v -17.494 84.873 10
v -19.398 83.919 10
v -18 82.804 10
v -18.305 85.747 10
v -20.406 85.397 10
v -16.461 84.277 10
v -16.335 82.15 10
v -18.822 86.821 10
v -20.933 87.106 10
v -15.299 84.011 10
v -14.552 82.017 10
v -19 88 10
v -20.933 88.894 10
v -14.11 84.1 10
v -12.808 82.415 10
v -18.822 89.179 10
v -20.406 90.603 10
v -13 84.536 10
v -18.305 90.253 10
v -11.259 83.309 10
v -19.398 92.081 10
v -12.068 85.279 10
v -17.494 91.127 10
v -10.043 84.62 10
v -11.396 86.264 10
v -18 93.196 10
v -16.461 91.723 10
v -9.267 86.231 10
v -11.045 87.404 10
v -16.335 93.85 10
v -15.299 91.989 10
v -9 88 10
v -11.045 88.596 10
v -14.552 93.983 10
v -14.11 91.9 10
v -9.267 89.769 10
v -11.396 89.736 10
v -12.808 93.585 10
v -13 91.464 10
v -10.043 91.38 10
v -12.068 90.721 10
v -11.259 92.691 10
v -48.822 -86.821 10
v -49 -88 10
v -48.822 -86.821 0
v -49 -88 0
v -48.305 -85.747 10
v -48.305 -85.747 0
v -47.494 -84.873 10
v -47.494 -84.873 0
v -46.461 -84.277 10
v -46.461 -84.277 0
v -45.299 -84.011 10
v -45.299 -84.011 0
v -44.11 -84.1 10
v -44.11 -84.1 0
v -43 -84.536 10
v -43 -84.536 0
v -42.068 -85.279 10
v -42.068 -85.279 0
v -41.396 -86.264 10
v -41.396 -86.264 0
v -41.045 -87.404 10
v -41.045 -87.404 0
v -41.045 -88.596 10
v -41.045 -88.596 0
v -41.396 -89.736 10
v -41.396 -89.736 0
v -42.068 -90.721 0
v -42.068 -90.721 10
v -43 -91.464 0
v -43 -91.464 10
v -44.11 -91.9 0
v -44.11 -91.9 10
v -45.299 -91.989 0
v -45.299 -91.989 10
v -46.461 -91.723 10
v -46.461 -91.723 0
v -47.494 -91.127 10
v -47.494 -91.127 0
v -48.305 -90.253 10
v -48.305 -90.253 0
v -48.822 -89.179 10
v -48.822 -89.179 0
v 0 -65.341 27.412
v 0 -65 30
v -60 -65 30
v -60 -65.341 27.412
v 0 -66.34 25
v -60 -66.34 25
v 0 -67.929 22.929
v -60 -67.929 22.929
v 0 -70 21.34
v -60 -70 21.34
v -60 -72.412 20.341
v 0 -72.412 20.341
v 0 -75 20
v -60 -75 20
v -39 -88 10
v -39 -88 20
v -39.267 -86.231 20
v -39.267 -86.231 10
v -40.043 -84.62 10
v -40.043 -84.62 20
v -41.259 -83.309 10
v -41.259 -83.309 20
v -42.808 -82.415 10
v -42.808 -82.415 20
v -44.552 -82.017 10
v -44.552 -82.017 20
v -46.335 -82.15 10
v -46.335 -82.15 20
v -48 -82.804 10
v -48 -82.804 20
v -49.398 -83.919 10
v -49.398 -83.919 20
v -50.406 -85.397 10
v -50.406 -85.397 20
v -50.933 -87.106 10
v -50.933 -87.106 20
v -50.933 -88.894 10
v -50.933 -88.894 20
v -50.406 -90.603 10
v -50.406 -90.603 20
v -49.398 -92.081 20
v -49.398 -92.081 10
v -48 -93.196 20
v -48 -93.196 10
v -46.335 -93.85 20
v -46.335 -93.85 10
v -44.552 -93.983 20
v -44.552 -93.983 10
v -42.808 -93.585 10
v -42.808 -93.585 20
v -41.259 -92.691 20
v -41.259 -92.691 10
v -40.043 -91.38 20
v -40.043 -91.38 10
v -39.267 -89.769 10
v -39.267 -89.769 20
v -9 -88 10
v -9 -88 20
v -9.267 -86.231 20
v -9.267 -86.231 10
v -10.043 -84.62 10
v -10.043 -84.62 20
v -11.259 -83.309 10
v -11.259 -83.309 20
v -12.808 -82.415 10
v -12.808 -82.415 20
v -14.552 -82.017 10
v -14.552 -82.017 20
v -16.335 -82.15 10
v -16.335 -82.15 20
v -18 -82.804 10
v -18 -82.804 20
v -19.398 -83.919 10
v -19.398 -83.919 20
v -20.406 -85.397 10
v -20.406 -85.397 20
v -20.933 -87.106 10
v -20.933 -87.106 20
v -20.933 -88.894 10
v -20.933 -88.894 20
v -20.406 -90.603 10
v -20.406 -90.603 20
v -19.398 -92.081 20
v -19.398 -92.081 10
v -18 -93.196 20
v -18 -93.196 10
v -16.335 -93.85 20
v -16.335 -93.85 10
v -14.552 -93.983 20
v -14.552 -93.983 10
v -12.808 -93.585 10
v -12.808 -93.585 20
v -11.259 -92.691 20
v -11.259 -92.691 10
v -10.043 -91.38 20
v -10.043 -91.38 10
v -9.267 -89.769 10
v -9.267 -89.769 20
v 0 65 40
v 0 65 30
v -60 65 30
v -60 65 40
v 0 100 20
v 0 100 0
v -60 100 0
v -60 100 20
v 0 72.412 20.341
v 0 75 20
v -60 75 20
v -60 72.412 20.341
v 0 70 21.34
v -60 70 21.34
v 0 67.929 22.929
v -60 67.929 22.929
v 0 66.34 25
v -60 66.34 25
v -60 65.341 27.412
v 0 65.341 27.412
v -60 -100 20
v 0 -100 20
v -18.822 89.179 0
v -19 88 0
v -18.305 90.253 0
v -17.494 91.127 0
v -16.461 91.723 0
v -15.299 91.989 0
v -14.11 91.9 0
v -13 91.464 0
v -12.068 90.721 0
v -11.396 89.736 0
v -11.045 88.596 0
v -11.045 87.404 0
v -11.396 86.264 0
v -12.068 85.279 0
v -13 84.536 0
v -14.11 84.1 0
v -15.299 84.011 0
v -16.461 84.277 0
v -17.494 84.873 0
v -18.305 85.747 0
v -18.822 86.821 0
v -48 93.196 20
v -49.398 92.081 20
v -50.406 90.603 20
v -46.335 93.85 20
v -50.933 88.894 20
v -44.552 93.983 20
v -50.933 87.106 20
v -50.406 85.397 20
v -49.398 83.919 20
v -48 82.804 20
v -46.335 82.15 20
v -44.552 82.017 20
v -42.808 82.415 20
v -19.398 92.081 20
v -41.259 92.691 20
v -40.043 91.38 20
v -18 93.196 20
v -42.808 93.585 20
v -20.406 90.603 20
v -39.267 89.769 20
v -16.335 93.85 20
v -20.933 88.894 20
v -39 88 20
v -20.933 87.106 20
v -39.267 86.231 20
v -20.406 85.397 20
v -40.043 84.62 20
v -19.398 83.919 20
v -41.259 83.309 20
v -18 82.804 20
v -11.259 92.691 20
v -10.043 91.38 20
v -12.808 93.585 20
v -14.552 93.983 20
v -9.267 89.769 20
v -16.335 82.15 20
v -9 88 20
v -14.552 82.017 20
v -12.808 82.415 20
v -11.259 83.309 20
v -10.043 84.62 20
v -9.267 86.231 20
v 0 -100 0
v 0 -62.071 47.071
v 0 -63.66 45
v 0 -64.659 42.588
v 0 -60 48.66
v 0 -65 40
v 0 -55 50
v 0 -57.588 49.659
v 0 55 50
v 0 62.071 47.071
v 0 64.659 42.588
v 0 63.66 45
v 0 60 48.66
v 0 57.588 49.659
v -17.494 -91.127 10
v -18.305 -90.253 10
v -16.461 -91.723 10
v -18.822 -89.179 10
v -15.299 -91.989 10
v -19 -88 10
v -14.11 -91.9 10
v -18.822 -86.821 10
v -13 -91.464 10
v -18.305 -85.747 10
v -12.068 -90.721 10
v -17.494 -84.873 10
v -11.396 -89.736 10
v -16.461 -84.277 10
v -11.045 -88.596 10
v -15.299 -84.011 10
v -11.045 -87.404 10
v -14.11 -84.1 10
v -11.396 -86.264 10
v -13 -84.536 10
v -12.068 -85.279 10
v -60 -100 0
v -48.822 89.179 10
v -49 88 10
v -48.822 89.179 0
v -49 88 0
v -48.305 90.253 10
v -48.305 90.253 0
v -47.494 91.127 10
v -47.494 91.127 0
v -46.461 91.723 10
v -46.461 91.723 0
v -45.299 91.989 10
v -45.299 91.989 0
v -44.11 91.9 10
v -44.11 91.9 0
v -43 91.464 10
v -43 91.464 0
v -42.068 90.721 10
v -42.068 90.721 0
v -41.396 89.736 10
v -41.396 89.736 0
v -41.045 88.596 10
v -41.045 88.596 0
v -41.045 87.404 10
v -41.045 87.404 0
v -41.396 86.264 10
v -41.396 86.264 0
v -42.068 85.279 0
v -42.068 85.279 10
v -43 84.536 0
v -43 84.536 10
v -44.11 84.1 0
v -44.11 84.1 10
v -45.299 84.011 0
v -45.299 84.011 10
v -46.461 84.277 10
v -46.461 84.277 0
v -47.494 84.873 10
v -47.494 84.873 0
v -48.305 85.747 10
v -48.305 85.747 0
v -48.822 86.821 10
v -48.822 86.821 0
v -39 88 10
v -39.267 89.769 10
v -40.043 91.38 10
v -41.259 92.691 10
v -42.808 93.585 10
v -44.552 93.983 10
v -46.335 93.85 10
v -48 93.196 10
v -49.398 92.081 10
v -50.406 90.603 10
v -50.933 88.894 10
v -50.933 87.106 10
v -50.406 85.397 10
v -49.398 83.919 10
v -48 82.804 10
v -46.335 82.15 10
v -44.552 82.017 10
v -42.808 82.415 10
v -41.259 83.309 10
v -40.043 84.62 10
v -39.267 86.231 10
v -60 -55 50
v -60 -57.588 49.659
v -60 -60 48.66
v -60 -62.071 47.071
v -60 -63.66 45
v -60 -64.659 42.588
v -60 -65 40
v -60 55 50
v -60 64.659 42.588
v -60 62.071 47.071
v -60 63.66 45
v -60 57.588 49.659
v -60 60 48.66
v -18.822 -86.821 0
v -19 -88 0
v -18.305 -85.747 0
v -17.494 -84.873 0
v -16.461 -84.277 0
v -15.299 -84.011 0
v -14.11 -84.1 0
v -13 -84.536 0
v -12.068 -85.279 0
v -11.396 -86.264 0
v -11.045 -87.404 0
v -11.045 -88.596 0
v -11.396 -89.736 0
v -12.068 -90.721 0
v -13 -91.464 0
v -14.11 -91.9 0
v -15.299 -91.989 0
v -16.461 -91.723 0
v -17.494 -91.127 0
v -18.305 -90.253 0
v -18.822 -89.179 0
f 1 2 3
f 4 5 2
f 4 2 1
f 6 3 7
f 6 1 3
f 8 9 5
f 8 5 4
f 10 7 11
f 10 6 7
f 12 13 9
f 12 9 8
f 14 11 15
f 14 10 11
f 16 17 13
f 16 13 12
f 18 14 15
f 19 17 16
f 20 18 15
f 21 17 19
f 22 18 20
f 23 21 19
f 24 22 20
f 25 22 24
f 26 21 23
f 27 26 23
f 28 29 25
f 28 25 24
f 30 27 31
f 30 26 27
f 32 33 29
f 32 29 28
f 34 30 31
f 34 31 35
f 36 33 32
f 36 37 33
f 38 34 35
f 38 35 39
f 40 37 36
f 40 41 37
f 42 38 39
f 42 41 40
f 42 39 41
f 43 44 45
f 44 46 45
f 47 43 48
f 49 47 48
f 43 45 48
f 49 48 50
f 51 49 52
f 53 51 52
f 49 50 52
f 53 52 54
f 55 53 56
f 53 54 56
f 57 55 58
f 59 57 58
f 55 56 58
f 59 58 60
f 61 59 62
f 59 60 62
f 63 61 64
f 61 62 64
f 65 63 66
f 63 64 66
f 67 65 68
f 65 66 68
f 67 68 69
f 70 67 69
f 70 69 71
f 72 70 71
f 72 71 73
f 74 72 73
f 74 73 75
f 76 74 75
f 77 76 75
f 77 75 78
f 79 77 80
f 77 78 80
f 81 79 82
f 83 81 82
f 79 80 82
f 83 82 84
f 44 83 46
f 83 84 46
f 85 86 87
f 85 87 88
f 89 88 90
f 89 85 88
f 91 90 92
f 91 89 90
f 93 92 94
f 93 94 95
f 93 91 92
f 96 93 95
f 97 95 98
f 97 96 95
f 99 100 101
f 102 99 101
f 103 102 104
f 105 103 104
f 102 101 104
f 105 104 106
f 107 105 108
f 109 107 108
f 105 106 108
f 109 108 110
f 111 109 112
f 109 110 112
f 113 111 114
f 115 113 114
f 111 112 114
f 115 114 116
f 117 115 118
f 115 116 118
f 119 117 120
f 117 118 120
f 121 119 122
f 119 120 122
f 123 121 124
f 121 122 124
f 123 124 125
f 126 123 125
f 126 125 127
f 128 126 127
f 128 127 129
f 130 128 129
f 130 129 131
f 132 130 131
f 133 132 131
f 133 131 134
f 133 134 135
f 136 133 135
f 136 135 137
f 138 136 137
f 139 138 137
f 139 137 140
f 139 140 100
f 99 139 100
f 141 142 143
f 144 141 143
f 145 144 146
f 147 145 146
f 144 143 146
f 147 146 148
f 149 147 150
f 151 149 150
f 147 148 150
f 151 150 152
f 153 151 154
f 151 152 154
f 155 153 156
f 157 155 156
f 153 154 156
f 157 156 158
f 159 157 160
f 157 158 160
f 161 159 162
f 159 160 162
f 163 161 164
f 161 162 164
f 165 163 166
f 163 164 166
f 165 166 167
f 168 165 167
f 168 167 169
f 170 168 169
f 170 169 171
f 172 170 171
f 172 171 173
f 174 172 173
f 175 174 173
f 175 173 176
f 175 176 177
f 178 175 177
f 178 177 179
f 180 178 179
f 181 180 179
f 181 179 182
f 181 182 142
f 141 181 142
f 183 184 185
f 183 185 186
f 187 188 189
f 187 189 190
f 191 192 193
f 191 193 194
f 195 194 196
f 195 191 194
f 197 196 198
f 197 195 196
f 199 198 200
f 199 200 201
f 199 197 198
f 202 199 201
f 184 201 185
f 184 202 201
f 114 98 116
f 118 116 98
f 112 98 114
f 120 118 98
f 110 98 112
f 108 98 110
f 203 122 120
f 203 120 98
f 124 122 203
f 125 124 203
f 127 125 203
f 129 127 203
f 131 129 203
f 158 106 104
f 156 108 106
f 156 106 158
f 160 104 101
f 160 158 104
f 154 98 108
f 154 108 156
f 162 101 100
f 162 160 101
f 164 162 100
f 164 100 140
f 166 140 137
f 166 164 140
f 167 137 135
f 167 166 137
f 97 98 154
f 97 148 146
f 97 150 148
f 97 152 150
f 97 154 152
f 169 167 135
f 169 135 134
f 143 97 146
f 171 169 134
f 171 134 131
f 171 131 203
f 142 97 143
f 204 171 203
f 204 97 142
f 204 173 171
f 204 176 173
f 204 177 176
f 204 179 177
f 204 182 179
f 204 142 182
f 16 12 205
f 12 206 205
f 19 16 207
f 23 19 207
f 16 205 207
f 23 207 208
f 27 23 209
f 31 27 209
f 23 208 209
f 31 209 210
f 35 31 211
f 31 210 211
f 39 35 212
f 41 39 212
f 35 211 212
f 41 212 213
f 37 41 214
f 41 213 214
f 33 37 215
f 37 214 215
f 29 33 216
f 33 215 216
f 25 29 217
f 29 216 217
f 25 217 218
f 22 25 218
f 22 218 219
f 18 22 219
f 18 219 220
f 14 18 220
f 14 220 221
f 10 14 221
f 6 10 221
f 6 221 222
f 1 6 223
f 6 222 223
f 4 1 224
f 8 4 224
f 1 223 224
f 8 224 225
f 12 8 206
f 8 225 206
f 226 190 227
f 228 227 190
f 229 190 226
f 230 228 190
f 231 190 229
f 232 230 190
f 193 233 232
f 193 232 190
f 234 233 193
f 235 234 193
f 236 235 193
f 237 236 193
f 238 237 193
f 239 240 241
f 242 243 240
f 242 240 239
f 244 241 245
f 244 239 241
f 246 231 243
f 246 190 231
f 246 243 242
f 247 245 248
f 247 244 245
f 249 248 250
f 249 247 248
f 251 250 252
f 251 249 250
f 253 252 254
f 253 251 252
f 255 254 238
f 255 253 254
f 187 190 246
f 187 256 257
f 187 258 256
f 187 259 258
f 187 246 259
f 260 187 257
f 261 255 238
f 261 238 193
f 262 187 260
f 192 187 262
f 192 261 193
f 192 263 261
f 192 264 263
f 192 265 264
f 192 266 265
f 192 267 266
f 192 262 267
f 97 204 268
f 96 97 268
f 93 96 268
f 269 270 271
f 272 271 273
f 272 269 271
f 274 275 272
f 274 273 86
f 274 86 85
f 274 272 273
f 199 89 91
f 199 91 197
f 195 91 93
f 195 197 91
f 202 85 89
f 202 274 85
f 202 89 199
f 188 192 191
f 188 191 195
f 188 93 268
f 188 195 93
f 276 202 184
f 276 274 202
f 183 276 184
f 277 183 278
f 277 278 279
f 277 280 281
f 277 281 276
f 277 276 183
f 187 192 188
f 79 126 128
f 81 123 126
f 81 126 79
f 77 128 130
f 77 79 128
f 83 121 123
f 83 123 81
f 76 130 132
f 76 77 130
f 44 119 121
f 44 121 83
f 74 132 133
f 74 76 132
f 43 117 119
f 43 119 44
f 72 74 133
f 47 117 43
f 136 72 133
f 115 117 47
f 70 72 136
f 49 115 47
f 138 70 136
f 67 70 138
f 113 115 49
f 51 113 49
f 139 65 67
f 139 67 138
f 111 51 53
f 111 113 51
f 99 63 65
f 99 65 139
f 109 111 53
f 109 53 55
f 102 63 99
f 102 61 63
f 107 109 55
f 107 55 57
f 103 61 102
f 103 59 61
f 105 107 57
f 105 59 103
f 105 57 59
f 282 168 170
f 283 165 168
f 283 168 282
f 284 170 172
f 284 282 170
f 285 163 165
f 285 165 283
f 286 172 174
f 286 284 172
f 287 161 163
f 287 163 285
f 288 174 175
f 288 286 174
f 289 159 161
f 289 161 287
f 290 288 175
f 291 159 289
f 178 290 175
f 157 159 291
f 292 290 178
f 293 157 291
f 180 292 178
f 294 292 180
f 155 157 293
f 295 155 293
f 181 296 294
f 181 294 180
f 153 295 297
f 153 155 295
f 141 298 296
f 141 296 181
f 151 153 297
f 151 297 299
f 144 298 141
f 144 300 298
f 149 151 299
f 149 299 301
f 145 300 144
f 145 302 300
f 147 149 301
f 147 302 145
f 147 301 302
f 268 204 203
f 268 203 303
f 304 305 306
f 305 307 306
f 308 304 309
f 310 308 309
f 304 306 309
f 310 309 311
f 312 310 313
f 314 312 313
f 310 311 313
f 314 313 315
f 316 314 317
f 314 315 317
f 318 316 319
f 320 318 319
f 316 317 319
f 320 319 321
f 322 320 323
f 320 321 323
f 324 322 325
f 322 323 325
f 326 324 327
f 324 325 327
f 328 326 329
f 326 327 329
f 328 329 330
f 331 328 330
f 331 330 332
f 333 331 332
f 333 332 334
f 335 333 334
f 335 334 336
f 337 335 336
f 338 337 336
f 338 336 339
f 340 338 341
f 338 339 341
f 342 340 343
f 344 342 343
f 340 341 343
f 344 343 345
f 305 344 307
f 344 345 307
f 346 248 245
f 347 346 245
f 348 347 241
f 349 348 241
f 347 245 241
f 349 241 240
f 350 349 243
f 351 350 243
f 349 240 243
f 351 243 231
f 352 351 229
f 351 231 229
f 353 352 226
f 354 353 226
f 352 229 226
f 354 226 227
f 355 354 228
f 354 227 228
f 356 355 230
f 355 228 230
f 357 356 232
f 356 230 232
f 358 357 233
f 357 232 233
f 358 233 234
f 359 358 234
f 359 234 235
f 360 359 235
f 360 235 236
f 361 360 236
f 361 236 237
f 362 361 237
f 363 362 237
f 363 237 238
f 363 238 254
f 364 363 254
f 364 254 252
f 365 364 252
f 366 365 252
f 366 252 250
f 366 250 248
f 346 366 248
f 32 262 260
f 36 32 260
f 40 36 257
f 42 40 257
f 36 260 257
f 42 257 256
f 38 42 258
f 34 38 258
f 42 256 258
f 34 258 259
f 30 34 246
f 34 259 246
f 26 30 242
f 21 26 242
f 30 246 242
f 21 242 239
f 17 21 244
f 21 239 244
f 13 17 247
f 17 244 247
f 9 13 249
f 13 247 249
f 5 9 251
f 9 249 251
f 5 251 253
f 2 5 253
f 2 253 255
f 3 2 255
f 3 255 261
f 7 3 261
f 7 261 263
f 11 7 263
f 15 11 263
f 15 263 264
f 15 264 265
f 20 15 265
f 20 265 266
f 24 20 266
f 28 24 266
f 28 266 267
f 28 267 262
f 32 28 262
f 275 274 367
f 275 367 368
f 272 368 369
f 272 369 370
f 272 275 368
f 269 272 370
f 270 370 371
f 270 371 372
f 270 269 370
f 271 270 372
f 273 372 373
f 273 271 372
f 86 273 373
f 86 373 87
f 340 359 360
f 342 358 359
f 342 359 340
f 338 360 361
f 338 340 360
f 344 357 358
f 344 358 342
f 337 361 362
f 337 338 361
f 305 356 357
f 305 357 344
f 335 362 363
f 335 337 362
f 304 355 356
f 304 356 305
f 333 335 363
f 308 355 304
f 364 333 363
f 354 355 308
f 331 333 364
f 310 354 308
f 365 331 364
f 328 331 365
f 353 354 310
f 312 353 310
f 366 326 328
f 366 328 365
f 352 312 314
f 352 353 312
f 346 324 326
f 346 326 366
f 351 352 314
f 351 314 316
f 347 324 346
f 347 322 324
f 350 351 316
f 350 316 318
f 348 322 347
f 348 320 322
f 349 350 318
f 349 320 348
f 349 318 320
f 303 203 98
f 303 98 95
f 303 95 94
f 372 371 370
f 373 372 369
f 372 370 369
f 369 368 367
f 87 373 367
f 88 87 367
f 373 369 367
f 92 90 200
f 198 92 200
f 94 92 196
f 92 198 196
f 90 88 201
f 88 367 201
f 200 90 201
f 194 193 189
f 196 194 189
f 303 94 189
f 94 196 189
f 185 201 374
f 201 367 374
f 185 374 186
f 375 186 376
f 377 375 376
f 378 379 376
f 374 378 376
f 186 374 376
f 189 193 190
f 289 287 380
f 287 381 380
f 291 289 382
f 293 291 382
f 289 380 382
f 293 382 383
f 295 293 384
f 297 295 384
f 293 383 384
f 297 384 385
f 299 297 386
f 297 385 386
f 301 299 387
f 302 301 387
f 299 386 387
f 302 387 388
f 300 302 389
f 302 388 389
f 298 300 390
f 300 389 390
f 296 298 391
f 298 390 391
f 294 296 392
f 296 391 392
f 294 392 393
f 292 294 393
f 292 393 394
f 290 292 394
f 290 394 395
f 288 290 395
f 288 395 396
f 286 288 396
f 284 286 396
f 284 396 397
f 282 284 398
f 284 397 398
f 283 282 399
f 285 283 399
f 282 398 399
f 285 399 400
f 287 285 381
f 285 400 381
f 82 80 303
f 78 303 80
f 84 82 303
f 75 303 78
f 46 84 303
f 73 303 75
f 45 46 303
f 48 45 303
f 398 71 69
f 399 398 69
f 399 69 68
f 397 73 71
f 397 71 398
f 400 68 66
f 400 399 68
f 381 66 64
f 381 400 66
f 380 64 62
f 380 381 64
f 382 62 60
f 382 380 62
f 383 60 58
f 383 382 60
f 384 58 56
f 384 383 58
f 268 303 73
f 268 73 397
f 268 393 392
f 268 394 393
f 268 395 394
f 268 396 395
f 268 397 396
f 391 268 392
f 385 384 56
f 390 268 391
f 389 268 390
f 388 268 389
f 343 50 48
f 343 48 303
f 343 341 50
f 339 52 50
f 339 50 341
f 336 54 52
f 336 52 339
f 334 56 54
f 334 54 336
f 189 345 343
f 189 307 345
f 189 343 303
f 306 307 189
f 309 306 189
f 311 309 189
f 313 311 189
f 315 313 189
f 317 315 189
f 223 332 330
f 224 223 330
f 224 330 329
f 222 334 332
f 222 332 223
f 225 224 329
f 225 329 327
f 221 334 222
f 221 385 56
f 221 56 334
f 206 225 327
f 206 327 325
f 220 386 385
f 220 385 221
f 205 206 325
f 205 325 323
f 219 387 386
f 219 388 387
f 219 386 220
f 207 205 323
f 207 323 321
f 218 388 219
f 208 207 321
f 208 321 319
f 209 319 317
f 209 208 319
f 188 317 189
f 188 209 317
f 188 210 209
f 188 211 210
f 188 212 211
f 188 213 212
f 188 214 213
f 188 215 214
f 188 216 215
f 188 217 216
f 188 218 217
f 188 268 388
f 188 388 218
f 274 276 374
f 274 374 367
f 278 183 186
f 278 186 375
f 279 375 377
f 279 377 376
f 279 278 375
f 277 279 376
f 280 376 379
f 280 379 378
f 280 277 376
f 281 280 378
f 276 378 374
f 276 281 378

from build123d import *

# Parameters (mm, degrees)
BOSS_EXTRUDE1_DEPTH                      = 60
CBORE_FOR_M10_HEX_HEAD_BOLT1_D           = 8
CBORE_FOR_M10_HEX_HEAD_BOLT1_CBORE_D     = 12
CBORE_FOR_M10_HEX_HEAD_BOLT1_CBORE_DEPTH = 10


with BuildPart() as part:
    # Sketch1 → Boss-Extrude1 (new body)
    with BuildSketch(Plane.YZ):
        with BuildLine():
            Line((-100, 0), (100, 0))
            Line((100, 0), (100, 20))
            Line((100, 20), (75, 20))
            ThreePointArc((75, 20), (67.928932188, 22.928932188), (65, 30))
            Line((65, 30), (65, 40))
            ThreePointArc((65, 40), (62.071067812, 47.071067812), (55, 50))
            Line((55, 50), (-55, 50))
            ThreePointArc((-55, 50), (-62.071067812, 47.071067812), (-65, 40))
            Line((-65, 40), (-65, 30))
            ThreePointArc((-65, 30), (-67.928932188, 22.928932188), (-75, 20))
            Line((-75, 20), (-100, 20))
            Line((-100, 20), (-100, 0))
        make_face()
    extrude(amount=-BOSS_EXTRUDE1_DEPTH)

    # CBORE for M10 Hex Head Bolt1 (through all)
    with Locations(Plane.XY.offset(20)):
        with Locations((-15, -88), (-45, -88), (-45, 88), (-15, 88)):
            CounterBoreHole(CBORE_FOR_M10_HEX_HEAD_BOLT1_D / 2, CBORE_FOR_M10_HEX_HEAD_BOLT1_CBORE_D / 2, CBORE_FOR_M10_HEX_HEAD_BOLT1_CBORE_DEPTH)


solid = part.part
